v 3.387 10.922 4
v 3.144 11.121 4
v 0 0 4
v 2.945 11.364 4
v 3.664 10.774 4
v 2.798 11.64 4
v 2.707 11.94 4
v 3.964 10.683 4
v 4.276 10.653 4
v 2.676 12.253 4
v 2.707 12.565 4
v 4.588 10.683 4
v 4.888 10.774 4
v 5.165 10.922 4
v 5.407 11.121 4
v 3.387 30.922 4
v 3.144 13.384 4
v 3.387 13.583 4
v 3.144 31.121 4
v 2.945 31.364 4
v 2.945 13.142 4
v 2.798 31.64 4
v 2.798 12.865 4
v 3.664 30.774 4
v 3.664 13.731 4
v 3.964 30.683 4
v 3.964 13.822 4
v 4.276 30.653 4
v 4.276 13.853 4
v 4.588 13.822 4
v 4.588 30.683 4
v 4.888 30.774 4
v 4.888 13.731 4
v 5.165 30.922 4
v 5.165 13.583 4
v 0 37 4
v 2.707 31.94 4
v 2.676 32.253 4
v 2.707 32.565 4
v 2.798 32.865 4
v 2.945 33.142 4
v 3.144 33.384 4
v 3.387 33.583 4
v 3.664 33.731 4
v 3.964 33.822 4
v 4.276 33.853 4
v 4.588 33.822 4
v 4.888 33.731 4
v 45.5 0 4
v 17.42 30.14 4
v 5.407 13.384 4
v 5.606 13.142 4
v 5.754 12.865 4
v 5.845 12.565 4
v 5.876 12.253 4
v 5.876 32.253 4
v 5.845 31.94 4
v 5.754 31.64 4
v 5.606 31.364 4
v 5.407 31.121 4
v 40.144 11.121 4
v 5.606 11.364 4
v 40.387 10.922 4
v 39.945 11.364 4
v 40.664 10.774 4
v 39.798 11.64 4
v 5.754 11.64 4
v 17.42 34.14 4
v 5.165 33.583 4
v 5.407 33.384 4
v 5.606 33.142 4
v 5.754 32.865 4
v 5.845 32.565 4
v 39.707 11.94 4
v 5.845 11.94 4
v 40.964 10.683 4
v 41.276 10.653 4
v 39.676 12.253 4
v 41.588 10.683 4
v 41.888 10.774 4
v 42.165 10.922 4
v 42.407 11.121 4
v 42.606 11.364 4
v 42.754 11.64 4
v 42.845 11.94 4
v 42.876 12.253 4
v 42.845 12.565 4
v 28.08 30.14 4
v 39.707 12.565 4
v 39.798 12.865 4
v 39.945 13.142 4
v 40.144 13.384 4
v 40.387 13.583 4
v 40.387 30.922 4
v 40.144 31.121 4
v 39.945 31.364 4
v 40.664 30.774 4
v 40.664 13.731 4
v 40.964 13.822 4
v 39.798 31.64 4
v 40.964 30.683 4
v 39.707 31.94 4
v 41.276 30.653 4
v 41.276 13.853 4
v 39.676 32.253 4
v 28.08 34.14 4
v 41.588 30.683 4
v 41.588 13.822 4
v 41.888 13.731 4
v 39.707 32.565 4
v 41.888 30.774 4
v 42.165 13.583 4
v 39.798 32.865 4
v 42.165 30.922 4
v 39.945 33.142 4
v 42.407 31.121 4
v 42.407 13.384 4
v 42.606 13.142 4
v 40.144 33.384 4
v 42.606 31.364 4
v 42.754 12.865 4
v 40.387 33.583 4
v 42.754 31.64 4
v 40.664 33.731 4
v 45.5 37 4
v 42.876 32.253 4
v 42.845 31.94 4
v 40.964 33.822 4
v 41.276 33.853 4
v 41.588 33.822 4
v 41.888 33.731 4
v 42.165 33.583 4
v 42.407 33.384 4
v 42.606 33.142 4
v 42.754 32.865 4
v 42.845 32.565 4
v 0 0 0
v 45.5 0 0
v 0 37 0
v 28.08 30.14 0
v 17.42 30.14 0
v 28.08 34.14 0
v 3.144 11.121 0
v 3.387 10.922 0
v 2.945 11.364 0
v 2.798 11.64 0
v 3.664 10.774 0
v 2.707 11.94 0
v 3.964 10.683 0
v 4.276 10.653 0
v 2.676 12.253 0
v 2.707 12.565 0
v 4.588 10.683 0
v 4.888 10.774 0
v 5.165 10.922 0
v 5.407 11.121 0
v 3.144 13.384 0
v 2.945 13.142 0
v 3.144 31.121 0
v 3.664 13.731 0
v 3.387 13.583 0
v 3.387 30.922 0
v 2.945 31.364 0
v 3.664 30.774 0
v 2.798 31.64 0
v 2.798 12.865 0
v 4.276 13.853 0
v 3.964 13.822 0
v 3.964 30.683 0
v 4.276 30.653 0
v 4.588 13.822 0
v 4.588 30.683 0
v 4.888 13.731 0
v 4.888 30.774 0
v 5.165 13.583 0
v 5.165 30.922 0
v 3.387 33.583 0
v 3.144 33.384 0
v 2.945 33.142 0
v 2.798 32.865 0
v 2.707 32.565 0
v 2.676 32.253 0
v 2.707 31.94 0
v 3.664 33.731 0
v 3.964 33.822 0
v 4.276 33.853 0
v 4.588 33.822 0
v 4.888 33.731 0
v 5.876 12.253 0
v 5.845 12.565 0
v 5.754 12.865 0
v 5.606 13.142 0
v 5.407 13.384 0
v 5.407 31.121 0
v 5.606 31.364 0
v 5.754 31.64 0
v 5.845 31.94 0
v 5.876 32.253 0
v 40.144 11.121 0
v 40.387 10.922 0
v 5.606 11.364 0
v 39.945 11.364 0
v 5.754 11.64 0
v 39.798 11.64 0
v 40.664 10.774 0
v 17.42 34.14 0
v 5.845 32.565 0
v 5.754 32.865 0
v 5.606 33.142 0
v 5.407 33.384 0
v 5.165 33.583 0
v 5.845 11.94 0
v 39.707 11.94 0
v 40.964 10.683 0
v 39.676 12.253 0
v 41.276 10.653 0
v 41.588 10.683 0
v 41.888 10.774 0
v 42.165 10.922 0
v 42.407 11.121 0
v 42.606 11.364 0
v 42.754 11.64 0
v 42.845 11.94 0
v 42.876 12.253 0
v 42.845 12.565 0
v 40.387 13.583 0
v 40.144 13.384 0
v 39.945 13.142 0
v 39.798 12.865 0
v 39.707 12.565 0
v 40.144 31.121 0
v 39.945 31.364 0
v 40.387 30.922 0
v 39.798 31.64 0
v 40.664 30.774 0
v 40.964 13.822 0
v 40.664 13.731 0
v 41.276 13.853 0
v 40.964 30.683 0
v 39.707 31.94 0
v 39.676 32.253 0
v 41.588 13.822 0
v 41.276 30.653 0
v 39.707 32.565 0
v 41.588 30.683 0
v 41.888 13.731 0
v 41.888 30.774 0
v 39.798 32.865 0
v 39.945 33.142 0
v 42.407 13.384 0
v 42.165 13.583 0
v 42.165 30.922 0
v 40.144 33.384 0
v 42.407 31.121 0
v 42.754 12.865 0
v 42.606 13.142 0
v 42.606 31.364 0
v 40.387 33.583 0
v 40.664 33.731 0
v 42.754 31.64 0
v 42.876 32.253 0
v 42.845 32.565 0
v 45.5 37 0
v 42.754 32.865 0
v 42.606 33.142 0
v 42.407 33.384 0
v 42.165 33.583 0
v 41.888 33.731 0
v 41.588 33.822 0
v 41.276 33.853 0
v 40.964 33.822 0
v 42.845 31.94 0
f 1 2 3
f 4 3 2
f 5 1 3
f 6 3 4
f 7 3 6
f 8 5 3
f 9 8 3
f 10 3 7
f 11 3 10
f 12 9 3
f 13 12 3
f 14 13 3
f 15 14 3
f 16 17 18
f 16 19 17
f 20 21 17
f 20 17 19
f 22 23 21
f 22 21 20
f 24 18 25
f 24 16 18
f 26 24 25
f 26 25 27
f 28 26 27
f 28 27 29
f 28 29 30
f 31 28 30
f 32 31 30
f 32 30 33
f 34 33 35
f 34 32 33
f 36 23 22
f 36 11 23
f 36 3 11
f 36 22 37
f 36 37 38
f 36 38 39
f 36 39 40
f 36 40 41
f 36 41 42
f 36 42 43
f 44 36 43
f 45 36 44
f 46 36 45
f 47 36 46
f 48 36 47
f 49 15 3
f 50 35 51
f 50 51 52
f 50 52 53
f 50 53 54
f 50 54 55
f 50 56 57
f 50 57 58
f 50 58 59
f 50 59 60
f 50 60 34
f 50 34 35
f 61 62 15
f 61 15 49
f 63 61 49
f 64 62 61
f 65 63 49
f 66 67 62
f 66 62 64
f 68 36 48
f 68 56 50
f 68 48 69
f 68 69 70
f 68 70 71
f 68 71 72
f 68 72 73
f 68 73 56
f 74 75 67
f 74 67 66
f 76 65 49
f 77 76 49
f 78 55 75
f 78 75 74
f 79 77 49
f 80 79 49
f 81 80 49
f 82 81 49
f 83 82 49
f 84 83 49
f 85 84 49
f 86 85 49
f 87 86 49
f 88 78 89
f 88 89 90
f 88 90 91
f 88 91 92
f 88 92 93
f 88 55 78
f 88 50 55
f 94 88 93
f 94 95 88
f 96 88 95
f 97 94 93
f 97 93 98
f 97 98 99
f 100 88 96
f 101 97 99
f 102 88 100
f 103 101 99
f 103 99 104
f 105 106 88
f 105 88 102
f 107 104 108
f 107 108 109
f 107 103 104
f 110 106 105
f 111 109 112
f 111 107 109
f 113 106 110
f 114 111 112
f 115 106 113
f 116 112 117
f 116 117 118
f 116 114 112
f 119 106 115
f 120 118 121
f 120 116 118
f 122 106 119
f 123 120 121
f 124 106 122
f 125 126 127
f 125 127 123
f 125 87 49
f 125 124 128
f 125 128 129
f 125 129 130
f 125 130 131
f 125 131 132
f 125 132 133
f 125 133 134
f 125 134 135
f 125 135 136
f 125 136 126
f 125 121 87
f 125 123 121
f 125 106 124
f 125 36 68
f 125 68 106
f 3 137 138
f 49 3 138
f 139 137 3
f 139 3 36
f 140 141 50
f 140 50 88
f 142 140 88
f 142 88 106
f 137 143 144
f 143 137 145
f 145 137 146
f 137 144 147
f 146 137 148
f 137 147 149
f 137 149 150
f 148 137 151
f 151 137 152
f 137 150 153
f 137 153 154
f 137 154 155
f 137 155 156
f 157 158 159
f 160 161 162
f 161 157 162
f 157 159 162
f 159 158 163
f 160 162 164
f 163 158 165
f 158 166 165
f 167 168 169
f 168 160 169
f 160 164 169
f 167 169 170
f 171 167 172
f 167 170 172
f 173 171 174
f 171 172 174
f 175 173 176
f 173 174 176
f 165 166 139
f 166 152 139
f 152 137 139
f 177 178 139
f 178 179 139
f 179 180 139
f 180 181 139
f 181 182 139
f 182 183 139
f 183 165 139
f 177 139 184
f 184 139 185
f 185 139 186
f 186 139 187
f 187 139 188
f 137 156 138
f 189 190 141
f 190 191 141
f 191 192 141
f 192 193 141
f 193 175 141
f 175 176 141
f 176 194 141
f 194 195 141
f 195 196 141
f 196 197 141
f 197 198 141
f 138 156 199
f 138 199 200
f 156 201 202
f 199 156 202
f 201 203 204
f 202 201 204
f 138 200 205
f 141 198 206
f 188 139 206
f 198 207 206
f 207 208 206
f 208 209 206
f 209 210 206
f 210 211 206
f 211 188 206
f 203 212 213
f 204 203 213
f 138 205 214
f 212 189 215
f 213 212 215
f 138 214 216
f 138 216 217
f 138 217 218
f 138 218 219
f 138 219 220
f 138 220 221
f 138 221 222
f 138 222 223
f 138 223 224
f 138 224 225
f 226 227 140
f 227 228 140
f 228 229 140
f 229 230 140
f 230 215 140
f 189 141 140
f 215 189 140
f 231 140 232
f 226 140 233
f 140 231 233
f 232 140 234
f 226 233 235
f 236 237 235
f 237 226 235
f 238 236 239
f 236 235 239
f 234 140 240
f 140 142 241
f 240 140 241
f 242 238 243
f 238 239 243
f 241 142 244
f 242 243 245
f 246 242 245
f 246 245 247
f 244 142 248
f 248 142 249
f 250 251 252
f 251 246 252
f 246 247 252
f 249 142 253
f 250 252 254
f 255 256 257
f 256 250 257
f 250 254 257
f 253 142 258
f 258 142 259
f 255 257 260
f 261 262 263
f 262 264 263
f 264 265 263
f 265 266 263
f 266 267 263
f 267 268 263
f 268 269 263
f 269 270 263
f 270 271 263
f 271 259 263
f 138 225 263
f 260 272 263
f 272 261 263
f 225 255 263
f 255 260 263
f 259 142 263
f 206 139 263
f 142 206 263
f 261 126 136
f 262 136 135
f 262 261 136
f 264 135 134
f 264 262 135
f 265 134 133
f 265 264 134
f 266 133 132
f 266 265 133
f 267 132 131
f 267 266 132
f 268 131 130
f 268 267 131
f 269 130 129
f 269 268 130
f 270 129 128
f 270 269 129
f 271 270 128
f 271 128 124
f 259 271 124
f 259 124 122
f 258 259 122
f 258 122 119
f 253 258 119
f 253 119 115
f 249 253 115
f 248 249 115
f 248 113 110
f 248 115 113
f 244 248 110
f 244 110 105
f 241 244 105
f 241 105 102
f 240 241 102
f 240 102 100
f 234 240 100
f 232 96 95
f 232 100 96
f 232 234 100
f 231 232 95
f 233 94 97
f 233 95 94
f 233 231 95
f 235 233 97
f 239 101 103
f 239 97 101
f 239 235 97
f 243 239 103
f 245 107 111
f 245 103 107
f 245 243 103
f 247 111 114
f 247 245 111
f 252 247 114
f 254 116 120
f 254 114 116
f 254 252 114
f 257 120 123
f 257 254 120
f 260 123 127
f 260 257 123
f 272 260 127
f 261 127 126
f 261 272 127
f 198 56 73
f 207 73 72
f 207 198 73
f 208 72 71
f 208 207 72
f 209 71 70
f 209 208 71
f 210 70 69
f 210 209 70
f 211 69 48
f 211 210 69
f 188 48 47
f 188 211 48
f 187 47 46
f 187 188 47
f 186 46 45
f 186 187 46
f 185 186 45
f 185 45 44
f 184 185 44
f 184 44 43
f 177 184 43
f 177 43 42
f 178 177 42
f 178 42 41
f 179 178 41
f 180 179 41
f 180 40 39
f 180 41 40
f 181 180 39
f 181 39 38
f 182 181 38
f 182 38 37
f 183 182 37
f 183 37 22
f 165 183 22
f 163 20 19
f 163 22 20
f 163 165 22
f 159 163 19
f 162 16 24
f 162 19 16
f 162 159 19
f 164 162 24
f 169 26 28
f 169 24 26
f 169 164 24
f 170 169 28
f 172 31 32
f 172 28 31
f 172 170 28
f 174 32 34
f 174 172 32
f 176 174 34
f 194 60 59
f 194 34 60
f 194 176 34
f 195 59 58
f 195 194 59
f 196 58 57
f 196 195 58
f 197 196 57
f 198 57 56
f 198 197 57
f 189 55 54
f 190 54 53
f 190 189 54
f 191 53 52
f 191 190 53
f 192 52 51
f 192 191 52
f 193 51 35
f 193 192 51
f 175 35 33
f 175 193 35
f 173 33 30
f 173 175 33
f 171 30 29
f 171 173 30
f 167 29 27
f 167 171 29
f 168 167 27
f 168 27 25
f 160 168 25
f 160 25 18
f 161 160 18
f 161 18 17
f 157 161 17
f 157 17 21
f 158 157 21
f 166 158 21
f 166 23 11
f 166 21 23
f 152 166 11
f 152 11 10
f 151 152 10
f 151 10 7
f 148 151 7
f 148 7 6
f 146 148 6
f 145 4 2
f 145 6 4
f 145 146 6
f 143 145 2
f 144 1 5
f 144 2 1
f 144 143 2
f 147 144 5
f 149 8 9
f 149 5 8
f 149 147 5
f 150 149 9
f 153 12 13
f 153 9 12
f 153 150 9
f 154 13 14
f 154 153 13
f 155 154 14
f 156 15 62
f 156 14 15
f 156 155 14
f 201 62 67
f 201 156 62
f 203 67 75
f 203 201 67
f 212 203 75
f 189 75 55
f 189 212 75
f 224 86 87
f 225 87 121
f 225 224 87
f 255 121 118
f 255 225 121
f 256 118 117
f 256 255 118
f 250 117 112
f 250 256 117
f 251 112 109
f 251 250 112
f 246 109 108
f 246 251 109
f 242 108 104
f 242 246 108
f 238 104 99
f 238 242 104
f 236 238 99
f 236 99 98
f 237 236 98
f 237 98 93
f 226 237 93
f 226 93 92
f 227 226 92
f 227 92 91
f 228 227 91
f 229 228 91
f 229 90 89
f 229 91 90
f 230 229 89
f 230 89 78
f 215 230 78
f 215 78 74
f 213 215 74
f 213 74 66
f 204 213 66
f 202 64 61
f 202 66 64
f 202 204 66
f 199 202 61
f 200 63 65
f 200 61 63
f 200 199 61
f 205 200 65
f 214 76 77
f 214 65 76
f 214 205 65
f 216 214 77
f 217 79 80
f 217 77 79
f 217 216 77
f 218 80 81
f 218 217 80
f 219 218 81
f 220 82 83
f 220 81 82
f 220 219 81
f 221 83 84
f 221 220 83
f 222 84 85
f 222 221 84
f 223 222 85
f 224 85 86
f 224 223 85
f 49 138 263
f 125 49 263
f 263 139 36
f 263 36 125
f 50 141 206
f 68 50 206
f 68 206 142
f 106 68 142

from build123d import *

# Parameters (mm, degrees)
SKETCH1_W               = 45.5
SKETCH1_H               = 37
SKETCH1_W_2             = 10.66
SKETCH1_H_2             = 4
BOSS_EXTRUDE1_DEPTH     = 4
SKETCH3_R               = 1.6
CUT_EXTRUDE5_DEPTH      = 10
CUT_EXTRUDE5_DEPTH_BACK = 1


with BuildPart() as part:
    # Sketch1 → Boss-Extrude1 (new body)
    with BuildSketch(Plane.XY):
        with Locations((22.75, 18.5)):
            Rectangle(SKETCH1_W, SKETCH1_H)
        with Locations((22.75, 32.14)):
            Rectangle(SKETCH1_W_2, SKETCH1_H_2, mode=Mode.SUBTRACT)
    extrude(amount=BOSS_EXTRUDE1_DEPTH)

    # Sketch3 → Cut-Extrude5 (cut, two sides)
    with BuildSketch(Plane.XY) as cut_extrude5_sk:
        with Locations((41.27584891, 32.252592082)):
            Circle(SKETCH3_R)
        with Locations((41.27584891, 12.252592082)):
            Circle(SKETCH3_R)
        with Locations((4.27584891, 12.252592082)):
            Circle(SKETCH3_R)
        with Locations((4.27584891, 32.252592082)):
            Circle(SKETCH3_R)
    extrude(amount=CUT_EXTRUDE5_DEPTH, mode=Mode.SUBTRACT)
    extrude(cut_extrude5_sk.sketch, amount=-CUT_EXTRUDE5_DEPTH_BACK, mode=Mode.SUBTRACT)


solid = part.part
